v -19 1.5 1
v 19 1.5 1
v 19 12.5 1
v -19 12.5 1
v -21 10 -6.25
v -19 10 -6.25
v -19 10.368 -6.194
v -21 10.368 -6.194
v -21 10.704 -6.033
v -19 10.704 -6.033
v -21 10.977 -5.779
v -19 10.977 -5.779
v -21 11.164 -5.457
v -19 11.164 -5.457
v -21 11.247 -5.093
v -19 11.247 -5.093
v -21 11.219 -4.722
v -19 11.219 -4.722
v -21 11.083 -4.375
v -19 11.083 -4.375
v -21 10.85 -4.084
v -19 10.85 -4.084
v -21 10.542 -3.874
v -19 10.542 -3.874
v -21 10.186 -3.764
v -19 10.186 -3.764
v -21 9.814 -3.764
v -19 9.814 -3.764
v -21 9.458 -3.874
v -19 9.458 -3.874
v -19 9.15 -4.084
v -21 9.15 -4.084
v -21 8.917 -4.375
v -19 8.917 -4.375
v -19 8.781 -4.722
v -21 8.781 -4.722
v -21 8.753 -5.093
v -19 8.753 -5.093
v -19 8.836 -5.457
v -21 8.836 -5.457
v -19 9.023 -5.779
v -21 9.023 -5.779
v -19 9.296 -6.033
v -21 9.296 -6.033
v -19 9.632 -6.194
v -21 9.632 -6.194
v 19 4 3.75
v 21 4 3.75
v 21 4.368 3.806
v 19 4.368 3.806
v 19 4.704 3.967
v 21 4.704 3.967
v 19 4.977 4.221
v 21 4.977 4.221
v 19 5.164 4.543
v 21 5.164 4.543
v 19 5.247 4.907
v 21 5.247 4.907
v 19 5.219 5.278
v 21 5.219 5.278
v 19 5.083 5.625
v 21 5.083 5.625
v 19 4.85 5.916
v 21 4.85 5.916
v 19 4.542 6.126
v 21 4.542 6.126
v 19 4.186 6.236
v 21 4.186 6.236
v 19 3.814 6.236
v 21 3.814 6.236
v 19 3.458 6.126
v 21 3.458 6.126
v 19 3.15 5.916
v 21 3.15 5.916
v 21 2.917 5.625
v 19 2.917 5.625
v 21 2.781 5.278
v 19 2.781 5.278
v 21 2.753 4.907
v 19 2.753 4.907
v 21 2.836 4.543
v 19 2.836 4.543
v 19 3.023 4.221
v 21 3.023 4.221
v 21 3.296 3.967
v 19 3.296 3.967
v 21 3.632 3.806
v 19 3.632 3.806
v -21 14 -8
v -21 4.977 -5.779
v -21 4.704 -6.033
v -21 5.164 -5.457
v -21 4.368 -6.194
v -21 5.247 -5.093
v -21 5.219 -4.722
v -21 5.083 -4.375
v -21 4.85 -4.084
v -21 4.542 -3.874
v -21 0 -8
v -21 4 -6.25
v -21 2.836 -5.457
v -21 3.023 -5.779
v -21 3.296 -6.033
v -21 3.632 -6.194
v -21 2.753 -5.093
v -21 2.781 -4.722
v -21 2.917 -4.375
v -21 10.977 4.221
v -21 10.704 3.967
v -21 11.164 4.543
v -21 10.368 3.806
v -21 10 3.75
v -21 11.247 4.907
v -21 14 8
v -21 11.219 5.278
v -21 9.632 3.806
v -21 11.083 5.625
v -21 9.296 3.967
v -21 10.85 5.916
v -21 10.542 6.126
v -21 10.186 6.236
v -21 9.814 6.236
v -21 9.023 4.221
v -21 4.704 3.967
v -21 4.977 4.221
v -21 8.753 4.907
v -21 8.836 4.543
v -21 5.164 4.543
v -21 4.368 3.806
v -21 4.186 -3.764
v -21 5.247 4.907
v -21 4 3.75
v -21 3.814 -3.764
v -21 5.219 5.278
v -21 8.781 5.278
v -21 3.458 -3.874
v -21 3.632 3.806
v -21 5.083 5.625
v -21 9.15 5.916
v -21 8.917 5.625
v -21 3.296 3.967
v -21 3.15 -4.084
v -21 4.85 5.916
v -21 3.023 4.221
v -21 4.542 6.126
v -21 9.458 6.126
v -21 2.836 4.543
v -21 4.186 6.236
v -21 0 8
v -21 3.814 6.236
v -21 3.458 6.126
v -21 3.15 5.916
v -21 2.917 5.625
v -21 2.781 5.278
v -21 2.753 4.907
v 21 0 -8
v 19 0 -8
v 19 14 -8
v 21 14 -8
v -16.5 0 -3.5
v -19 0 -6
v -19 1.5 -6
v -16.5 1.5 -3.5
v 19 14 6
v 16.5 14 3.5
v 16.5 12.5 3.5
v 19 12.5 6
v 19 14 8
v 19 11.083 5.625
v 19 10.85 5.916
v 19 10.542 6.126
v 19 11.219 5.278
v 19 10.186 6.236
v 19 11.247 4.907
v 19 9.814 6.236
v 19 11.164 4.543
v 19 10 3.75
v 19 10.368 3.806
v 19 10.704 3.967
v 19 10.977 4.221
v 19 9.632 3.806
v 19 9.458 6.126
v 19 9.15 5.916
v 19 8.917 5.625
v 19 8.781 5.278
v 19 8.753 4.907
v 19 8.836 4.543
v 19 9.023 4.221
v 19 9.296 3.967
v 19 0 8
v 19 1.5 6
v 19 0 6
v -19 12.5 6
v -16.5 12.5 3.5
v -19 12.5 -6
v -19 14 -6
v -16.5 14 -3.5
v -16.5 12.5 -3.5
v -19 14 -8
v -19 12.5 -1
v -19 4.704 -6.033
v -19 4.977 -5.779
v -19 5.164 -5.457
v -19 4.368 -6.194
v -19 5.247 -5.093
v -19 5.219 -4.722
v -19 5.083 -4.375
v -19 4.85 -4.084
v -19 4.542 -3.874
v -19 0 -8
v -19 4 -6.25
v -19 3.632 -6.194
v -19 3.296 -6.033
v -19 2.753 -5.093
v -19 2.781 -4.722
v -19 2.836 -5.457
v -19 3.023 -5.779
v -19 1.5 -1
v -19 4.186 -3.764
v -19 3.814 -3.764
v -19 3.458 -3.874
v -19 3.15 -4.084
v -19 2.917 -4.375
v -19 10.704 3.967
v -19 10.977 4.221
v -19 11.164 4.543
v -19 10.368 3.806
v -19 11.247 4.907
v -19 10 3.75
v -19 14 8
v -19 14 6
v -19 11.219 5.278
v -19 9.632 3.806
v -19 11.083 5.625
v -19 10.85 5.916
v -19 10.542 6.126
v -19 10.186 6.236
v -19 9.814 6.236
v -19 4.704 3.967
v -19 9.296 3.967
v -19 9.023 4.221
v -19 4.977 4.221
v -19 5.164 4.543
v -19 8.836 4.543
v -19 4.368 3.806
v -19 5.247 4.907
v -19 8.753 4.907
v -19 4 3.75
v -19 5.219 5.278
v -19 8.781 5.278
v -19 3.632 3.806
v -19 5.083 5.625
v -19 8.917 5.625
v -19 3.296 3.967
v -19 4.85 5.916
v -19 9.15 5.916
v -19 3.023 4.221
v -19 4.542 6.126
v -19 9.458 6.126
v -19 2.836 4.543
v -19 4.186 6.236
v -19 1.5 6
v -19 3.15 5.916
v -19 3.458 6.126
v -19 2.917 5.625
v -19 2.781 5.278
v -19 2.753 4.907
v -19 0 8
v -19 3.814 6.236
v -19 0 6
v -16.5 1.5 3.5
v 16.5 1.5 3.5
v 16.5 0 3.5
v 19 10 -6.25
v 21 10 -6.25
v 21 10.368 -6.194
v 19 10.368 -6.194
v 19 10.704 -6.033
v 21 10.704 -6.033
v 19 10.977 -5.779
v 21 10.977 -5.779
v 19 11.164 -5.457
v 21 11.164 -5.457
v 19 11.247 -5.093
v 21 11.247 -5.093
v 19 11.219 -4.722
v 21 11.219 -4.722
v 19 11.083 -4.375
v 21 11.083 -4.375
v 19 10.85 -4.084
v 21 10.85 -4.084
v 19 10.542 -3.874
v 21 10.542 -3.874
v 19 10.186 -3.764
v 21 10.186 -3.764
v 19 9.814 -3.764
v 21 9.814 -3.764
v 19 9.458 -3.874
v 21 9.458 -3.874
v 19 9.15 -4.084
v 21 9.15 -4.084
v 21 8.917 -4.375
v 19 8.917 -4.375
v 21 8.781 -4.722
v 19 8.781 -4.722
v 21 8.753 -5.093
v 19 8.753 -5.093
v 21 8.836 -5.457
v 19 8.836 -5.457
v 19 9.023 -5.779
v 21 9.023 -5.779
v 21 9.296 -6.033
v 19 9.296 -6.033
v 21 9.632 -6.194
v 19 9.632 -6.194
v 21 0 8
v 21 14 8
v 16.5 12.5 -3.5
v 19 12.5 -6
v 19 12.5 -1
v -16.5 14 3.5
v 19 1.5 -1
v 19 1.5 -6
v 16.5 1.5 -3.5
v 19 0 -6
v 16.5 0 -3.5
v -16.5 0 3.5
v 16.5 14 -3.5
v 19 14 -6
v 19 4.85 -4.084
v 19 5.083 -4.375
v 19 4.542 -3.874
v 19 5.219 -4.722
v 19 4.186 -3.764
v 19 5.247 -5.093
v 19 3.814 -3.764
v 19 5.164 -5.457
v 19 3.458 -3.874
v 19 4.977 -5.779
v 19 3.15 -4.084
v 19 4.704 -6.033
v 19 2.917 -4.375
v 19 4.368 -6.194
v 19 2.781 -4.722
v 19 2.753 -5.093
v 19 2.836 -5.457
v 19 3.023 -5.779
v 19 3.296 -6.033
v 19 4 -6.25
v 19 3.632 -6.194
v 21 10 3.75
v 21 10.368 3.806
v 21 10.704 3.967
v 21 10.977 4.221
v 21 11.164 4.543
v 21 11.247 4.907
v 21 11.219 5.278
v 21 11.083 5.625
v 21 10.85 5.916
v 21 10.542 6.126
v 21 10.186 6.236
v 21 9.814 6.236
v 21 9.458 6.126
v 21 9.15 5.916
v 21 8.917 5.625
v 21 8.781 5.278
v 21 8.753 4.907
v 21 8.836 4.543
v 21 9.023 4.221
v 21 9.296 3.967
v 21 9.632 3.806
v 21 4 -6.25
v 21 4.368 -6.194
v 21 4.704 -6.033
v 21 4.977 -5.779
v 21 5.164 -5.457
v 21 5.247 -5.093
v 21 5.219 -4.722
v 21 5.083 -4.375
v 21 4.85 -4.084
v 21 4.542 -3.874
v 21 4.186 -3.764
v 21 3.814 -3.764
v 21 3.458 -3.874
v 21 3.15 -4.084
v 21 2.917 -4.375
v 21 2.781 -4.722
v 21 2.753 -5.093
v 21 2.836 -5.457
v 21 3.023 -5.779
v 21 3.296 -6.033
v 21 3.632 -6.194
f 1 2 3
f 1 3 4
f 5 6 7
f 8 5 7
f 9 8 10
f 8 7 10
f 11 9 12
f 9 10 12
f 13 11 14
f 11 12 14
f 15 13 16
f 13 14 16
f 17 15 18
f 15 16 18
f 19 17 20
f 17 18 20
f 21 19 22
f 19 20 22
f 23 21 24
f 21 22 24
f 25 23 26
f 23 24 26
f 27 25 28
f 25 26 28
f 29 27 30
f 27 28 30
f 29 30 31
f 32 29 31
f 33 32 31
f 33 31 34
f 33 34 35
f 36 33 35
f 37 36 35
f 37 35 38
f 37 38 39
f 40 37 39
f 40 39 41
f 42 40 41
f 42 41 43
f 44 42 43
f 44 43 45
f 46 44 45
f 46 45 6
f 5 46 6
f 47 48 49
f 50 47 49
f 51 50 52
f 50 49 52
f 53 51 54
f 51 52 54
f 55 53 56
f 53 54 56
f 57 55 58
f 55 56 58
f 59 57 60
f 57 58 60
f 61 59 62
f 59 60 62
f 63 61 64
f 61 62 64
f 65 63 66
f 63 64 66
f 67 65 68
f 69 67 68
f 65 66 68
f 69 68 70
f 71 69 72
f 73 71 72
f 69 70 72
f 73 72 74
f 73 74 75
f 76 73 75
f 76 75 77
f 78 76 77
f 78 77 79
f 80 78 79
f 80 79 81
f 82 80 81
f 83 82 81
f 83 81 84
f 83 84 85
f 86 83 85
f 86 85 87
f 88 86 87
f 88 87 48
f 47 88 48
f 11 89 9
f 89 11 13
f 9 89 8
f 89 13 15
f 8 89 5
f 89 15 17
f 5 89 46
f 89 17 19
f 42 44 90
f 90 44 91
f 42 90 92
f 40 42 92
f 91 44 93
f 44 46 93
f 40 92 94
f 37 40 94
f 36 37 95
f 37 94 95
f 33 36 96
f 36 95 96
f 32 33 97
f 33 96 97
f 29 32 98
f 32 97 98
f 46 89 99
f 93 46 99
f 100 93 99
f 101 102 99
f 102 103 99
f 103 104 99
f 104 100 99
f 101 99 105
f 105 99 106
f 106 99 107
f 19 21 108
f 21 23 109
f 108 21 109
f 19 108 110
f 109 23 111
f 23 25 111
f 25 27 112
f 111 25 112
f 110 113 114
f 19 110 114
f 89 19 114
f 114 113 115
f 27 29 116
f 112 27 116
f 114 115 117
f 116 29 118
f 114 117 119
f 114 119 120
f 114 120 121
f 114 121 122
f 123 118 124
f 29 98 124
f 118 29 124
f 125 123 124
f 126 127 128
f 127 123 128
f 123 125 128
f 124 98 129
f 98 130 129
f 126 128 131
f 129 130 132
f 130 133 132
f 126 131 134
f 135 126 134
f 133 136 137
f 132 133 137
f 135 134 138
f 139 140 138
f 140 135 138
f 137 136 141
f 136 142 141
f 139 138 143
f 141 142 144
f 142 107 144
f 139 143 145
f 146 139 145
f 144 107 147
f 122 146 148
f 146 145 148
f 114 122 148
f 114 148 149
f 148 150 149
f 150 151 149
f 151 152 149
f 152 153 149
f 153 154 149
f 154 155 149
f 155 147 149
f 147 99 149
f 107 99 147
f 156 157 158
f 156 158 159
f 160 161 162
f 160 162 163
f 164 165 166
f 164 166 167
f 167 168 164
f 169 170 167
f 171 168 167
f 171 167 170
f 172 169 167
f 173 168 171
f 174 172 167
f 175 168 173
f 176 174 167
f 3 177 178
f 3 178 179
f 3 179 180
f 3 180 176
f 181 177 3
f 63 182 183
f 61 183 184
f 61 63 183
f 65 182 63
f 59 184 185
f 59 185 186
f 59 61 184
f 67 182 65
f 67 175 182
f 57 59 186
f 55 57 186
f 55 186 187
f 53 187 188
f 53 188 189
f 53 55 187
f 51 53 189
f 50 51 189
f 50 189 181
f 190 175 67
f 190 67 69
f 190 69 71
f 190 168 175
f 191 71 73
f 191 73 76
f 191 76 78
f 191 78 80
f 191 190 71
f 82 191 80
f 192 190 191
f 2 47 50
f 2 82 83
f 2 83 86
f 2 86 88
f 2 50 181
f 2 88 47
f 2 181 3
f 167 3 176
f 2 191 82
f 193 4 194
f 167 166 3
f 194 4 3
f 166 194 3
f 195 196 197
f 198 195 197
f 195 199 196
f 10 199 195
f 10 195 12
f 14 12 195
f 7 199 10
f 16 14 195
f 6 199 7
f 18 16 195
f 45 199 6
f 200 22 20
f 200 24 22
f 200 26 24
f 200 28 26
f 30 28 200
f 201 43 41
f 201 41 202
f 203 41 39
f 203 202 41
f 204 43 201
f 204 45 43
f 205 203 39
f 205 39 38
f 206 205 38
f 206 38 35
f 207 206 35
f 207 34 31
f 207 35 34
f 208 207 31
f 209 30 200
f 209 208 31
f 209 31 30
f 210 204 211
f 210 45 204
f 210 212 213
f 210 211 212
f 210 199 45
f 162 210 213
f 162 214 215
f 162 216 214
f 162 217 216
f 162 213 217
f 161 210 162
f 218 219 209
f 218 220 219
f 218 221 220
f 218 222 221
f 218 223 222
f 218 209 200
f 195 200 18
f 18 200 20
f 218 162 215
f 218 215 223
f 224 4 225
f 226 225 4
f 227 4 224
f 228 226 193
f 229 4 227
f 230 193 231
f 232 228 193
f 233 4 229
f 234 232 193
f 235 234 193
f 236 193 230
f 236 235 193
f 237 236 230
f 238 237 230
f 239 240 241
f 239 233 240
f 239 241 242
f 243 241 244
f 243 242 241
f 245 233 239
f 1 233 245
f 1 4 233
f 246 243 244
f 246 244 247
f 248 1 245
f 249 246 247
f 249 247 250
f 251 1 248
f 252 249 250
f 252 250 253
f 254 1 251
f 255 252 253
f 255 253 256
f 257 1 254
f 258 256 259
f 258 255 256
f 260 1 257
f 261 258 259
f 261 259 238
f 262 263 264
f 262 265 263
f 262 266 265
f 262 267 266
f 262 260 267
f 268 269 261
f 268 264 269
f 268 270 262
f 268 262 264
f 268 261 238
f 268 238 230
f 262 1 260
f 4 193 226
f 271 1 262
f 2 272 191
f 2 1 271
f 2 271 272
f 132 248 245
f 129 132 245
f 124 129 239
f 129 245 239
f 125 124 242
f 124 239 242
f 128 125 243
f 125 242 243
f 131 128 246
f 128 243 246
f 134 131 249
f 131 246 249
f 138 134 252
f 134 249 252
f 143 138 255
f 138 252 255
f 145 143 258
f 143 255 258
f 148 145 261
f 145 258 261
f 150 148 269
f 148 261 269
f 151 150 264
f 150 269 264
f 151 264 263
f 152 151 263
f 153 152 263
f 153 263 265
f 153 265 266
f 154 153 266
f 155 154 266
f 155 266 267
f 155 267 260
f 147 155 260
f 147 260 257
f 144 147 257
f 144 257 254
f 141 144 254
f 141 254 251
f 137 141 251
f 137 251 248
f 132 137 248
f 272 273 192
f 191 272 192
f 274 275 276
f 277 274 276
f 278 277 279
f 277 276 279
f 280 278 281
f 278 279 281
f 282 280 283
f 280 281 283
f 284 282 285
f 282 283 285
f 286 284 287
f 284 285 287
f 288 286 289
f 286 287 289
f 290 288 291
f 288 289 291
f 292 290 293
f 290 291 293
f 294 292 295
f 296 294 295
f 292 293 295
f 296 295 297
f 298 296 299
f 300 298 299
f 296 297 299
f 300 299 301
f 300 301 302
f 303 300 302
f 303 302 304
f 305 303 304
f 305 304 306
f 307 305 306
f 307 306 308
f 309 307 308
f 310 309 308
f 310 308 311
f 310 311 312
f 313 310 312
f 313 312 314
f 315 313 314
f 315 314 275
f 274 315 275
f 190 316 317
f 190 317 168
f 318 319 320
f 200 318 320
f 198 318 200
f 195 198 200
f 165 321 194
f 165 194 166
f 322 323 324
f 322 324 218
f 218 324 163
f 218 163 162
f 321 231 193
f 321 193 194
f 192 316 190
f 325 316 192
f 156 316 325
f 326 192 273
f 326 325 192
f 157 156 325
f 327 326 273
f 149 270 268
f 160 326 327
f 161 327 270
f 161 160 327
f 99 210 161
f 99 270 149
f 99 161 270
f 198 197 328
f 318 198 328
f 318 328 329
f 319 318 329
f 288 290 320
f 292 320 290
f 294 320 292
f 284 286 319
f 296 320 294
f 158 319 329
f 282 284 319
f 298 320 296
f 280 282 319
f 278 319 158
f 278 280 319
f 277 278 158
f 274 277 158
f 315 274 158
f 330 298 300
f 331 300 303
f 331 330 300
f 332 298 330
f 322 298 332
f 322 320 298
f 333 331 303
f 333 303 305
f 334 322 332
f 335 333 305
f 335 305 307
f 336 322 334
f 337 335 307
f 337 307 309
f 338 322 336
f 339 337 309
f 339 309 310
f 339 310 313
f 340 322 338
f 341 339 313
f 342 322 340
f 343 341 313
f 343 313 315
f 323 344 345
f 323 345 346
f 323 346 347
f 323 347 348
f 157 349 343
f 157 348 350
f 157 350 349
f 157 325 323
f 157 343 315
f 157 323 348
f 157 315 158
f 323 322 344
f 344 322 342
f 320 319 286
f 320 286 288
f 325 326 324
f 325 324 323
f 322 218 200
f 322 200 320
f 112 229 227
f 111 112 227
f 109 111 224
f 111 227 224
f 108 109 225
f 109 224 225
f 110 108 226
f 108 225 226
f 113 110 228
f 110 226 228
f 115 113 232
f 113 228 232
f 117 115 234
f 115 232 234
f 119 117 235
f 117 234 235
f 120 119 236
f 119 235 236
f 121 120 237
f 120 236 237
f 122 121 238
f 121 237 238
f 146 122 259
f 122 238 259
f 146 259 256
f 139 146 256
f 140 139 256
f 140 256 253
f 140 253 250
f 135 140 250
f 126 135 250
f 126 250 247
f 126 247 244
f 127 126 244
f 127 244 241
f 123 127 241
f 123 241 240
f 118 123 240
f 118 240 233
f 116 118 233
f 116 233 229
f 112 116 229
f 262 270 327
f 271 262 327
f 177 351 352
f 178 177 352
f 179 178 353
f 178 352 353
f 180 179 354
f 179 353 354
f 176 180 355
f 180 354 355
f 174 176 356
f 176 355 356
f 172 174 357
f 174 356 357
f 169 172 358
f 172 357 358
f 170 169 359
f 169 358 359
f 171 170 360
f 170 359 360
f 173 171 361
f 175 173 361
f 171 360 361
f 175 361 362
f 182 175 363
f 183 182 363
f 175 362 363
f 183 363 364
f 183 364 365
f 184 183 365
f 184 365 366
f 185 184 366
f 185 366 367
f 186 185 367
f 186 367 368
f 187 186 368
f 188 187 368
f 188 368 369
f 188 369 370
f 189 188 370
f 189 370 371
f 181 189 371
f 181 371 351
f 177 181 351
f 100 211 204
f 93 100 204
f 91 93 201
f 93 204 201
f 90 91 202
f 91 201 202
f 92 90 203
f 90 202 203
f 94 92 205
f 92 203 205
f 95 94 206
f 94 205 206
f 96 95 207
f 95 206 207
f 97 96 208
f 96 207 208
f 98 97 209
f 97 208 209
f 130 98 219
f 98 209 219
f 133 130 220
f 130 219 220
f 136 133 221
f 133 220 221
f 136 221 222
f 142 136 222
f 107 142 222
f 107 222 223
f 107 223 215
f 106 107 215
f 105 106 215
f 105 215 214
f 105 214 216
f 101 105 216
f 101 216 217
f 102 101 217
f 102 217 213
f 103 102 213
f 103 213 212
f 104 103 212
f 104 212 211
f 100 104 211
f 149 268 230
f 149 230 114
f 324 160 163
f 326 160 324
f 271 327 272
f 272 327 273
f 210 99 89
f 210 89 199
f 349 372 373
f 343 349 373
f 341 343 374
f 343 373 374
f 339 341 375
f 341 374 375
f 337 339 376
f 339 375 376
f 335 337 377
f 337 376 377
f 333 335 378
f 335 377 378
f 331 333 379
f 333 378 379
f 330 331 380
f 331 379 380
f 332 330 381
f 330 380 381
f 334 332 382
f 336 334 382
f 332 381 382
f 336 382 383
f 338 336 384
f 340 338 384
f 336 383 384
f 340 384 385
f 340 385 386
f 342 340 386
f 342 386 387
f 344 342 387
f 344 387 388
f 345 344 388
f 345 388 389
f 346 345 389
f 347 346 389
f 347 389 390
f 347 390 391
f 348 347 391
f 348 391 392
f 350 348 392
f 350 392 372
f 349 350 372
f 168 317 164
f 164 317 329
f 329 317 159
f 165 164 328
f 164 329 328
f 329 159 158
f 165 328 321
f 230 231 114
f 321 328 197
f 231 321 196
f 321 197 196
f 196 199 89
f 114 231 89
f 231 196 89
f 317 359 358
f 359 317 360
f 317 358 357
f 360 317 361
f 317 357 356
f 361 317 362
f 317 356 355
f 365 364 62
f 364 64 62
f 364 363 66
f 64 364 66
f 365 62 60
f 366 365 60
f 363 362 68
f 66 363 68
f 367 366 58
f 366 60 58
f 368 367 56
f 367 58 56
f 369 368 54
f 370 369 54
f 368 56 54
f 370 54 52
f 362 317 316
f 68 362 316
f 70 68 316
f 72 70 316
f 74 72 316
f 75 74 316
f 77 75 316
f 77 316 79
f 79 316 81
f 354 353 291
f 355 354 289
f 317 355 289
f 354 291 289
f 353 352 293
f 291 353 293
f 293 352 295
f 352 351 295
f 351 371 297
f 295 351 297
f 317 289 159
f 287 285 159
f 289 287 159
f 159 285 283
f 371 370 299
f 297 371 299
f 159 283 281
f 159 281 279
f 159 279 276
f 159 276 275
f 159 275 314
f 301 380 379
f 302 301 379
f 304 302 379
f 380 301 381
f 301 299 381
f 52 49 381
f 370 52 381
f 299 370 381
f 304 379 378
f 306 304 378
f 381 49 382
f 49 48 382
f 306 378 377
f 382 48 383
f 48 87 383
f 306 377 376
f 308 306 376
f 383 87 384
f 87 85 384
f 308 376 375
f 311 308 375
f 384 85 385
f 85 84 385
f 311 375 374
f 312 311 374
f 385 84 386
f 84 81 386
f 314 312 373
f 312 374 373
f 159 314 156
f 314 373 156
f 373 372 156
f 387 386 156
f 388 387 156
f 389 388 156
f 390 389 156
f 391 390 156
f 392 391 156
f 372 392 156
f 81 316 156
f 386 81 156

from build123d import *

# Parameters (mm, degrees)
BOSS_EXTRUDE1_DEPTH = 14
SKETCH2_R           = 1.25
CUT_EXTRUDE1_DEPTH  = 43
BOSS_EXTRUDE2_DEPTH = 1.5


with BuildPart() as part:
    # Sketch1 → Boss-Extrude1 (new body)
    with BuildSketch(Plane(origin=(0, 0, 0), x_dir=(1, 0, 0), z_dir=(0, 1, 0))):
        Polygon((-19, 1), (19, 1), (19, 8), (21, 8), (21, 1), (21, -1), (21, -8), (19, -8), (19, -1), (-19, -1), (-19, -8), (-21, -8), (-21, -1), (-21, 1), (-21, 8), (-19, 8), align=None)
    extrude(amount=BOSS_EXTRUDE1_DEPTH)

    # Sketch2 → Cut-Extrude1 (cut, through all)
    with BuildSketch(Plane(origin=(21, 0, 0), x_dir=(0, 0, -1), z_dir=(1, 0, 0))):
        with Locations((5, 10)):
            Circle(SKETCH2_R)
        with Locations((5, 4)):
            Circle(SKETCH2_R)
        with Locations((-5, 4)):
            Circle(SKETCH2_R)
        with Locations((-5, 10)):
            Circle(SKETCH2_R)
    extrude(amount=-CUT_EXTRUDE1_DEPTH, mode=Mode.SUBTRACT)

    # Sketch3 → Boss-Extrude2 (add)
    with BuildSketch(Plane(origin=(0, 14, 0), x_dir=(1, 0, 0), z_dir=(0, 1, 0))):
        Polygon((-19, 1), (-19, 6), (-16.5, 3.5), (16.5, 3.5), (19, 6), (19, 1), (14, 1), (-14, 1), align=None)
        Polygon((19, -1), (14, -1), (-14, -1), (-19, -1), (-19, -6), (-16.5, -3.5), (16.5, -3.5), (19, -6), align=None)
    boss_extrude2 = extrude(amount=-BOSS_EXTRUDE2_DEPTH)

    # Mirror1: Boss-Extrude2 across plane
    add(boss_extrude2.mirror(Plane.ZX.offset(7)))


solid = part.part
